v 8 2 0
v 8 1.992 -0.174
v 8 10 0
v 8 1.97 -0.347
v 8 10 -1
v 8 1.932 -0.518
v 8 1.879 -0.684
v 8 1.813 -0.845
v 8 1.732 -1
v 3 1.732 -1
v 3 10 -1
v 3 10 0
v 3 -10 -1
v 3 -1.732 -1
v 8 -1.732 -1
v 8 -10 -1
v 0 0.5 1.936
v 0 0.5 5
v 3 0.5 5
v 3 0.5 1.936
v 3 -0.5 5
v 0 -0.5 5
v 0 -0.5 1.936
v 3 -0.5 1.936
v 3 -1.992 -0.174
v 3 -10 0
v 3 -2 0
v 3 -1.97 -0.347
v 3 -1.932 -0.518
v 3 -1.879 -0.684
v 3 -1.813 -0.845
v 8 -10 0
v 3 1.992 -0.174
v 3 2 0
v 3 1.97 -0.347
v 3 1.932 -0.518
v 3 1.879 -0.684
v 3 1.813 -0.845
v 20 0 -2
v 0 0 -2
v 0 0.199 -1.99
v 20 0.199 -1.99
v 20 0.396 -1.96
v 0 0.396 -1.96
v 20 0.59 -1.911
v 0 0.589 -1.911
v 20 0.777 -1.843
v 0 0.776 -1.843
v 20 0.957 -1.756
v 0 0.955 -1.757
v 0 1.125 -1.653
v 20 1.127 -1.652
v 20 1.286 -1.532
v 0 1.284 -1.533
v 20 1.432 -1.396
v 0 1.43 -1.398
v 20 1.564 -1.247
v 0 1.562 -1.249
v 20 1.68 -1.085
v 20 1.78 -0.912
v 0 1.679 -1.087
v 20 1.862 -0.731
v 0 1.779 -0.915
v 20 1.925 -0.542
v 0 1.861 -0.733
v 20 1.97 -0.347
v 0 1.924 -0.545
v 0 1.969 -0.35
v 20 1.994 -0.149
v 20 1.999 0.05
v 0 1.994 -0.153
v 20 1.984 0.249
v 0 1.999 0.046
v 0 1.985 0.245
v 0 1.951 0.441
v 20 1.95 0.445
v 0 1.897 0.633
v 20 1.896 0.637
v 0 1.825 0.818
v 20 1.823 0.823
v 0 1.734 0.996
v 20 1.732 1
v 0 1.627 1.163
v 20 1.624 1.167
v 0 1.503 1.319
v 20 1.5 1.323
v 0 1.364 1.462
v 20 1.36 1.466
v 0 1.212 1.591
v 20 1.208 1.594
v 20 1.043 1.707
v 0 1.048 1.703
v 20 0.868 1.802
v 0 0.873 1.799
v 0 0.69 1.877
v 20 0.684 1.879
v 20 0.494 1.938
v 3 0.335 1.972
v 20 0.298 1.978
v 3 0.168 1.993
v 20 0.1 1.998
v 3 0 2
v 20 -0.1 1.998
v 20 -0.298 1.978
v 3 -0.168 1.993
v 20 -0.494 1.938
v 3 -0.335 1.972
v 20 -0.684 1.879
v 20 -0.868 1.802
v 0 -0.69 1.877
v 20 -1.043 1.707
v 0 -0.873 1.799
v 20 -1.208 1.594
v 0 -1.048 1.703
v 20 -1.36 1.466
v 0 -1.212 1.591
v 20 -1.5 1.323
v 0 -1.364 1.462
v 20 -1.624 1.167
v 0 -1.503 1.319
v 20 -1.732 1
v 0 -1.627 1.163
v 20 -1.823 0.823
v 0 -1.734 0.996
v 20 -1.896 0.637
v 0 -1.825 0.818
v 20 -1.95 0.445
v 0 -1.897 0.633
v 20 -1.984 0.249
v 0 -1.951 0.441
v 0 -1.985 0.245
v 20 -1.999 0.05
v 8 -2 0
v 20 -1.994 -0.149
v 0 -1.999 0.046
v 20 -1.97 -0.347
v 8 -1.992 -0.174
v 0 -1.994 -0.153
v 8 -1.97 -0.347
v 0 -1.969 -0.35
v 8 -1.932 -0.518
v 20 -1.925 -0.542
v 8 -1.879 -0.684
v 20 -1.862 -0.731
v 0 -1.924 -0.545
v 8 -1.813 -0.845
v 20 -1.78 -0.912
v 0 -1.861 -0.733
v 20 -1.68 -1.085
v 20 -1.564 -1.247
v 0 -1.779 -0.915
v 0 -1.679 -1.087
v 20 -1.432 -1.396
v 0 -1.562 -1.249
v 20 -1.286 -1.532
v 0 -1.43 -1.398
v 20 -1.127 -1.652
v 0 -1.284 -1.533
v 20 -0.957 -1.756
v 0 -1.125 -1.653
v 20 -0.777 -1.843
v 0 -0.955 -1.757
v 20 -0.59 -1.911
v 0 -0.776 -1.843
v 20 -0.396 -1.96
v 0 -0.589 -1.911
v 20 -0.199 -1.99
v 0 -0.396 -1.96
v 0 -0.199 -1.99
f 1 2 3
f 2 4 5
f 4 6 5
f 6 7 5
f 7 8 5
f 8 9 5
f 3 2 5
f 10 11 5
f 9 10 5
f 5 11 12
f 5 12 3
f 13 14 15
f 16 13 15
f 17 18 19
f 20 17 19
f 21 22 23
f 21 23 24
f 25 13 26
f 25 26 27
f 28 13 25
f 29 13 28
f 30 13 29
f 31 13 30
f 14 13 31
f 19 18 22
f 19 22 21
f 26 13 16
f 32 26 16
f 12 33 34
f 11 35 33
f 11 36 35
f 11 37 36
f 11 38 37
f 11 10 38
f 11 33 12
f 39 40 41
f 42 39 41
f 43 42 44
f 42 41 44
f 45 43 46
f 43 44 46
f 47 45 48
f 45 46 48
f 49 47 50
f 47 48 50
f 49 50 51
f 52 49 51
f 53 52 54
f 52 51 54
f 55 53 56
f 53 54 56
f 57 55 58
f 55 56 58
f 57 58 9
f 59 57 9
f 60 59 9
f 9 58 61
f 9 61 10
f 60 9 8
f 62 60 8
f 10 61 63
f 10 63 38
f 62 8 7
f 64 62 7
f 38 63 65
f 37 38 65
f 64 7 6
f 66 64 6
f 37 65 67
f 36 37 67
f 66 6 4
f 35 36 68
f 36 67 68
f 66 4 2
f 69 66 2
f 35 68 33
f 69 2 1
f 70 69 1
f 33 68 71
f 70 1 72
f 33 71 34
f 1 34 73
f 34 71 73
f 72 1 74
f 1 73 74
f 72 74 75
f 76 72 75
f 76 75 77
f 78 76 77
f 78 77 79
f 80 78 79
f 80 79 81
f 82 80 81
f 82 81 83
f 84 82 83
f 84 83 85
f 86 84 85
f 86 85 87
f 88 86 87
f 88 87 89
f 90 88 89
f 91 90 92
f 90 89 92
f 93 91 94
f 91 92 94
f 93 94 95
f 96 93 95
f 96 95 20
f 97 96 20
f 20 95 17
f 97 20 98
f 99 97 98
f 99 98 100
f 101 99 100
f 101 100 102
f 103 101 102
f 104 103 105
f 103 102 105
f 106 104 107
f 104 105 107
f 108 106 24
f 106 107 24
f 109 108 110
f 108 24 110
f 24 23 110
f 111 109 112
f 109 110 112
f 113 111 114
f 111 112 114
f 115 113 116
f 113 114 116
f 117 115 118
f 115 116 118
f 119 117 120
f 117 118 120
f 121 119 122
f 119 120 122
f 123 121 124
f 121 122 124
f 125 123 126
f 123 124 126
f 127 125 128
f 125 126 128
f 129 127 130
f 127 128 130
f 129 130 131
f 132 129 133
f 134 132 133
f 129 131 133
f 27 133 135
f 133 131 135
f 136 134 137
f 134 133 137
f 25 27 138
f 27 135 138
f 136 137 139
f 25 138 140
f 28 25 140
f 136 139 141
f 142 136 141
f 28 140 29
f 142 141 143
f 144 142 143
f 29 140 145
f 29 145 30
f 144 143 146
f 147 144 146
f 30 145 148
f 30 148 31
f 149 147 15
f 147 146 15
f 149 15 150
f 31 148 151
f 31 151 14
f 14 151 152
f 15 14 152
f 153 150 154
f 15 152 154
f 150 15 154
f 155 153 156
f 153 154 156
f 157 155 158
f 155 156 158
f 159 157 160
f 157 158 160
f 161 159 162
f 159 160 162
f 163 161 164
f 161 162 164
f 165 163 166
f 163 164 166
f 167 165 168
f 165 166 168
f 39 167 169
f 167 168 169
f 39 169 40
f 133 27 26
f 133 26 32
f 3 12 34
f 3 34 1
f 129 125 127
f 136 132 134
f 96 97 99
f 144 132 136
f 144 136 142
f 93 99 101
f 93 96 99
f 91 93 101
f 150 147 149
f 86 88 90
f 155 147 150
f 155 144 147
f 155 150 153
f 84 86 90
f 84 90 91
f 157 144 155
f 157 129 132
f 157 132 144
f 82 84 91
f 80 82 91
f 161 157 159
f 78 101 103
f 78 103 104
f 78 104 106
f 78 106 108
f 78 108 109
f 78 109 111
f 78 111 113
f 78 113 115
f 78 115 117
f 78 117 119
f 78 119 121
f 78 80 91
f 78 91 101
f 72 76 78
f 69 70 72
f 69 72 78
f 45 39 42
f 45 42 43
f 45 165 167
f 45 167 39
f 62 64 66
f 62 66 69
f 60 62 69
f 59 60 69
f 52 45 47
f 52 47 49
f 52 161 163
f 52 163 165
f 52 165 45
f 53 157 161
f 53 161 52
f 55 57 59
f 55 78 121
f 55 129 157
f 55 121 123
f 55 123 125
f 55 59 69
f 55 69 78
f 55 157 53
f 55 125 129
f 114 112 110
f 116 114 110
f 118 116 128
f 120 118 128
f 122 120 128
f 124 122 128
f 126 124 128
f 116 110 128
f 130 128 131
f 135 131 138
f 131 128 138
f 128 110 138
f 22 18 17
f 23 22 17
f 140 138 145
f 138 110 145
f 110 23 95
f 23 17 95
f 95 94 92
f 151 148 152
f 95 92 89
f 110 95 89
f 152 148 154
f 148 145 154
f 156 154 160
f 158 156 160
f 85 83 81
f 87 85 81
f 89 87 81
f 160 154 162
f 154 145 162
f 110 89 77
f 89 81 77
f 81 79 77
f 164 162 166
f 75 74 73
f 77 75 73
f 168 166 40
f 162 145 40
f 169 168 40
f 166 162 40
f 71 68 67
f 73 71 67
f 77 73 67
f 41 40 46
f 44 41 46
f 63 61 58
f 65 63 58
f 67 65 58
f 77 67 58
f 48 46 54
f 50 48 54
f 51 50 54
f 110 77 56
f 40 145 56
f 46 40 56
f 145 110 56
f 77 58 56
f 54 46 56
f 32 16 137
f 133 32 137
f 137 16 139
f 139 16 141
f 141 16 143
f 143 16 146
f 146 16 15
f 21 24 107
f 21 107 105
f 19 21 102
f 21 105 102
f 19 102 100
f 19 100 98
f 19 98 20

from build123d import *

# Parameters (mm, degrees)
BOX_W          = 5
BOX_H          = 20
BOX_DEPTH      = 1
CYLINDER_R     = 2
CYLINDER_DEPTH = 20
BOX001_W       = 3
BOX001_H       = 1
BOX001_DEPTH   = 5


with BuildPart() as cube:
    # Box → Box (new body)
    with BuildSketch(Plane(origin=(3, -10, -1), x_dir=(1, 0, 0), z_dir=(0, 0, 1))):
        with Locations((2.5, 10)):
            Rectangle(BOX_W, BOX_H)
    extrude(amount=BOX_DEPTH)


with BuildPart() as fusion:
    # Cylinder → Cylinder (new body)
    with BuildSketch(Plane(origin=(0, 0, 0), x_dir=(0, 0, -1), z_dir=(1, 0, 0))):
        Circle(CYLINDER_R)
    extrude(amount=CYLINDER_DEPTH)

    # Fusion: union Cube
    add(cube.part)


with BuildPart() as aeroplane:
    # Box001 → Box001 (new body)
    with BuildSketch(Plane(origin=(0, -0.5, 0), x_dir=(1, 0, 0), z_dir=(0, 0, 1))):
        with Locations((1.5, 0.5)):
            Rectangle(BOX001_W, BOX001_H)
    extrude(amount=BOX001_DEPTH)

    # Fusion001: union Fusion
    add(fusion.part)


solid = aeroplane.part
